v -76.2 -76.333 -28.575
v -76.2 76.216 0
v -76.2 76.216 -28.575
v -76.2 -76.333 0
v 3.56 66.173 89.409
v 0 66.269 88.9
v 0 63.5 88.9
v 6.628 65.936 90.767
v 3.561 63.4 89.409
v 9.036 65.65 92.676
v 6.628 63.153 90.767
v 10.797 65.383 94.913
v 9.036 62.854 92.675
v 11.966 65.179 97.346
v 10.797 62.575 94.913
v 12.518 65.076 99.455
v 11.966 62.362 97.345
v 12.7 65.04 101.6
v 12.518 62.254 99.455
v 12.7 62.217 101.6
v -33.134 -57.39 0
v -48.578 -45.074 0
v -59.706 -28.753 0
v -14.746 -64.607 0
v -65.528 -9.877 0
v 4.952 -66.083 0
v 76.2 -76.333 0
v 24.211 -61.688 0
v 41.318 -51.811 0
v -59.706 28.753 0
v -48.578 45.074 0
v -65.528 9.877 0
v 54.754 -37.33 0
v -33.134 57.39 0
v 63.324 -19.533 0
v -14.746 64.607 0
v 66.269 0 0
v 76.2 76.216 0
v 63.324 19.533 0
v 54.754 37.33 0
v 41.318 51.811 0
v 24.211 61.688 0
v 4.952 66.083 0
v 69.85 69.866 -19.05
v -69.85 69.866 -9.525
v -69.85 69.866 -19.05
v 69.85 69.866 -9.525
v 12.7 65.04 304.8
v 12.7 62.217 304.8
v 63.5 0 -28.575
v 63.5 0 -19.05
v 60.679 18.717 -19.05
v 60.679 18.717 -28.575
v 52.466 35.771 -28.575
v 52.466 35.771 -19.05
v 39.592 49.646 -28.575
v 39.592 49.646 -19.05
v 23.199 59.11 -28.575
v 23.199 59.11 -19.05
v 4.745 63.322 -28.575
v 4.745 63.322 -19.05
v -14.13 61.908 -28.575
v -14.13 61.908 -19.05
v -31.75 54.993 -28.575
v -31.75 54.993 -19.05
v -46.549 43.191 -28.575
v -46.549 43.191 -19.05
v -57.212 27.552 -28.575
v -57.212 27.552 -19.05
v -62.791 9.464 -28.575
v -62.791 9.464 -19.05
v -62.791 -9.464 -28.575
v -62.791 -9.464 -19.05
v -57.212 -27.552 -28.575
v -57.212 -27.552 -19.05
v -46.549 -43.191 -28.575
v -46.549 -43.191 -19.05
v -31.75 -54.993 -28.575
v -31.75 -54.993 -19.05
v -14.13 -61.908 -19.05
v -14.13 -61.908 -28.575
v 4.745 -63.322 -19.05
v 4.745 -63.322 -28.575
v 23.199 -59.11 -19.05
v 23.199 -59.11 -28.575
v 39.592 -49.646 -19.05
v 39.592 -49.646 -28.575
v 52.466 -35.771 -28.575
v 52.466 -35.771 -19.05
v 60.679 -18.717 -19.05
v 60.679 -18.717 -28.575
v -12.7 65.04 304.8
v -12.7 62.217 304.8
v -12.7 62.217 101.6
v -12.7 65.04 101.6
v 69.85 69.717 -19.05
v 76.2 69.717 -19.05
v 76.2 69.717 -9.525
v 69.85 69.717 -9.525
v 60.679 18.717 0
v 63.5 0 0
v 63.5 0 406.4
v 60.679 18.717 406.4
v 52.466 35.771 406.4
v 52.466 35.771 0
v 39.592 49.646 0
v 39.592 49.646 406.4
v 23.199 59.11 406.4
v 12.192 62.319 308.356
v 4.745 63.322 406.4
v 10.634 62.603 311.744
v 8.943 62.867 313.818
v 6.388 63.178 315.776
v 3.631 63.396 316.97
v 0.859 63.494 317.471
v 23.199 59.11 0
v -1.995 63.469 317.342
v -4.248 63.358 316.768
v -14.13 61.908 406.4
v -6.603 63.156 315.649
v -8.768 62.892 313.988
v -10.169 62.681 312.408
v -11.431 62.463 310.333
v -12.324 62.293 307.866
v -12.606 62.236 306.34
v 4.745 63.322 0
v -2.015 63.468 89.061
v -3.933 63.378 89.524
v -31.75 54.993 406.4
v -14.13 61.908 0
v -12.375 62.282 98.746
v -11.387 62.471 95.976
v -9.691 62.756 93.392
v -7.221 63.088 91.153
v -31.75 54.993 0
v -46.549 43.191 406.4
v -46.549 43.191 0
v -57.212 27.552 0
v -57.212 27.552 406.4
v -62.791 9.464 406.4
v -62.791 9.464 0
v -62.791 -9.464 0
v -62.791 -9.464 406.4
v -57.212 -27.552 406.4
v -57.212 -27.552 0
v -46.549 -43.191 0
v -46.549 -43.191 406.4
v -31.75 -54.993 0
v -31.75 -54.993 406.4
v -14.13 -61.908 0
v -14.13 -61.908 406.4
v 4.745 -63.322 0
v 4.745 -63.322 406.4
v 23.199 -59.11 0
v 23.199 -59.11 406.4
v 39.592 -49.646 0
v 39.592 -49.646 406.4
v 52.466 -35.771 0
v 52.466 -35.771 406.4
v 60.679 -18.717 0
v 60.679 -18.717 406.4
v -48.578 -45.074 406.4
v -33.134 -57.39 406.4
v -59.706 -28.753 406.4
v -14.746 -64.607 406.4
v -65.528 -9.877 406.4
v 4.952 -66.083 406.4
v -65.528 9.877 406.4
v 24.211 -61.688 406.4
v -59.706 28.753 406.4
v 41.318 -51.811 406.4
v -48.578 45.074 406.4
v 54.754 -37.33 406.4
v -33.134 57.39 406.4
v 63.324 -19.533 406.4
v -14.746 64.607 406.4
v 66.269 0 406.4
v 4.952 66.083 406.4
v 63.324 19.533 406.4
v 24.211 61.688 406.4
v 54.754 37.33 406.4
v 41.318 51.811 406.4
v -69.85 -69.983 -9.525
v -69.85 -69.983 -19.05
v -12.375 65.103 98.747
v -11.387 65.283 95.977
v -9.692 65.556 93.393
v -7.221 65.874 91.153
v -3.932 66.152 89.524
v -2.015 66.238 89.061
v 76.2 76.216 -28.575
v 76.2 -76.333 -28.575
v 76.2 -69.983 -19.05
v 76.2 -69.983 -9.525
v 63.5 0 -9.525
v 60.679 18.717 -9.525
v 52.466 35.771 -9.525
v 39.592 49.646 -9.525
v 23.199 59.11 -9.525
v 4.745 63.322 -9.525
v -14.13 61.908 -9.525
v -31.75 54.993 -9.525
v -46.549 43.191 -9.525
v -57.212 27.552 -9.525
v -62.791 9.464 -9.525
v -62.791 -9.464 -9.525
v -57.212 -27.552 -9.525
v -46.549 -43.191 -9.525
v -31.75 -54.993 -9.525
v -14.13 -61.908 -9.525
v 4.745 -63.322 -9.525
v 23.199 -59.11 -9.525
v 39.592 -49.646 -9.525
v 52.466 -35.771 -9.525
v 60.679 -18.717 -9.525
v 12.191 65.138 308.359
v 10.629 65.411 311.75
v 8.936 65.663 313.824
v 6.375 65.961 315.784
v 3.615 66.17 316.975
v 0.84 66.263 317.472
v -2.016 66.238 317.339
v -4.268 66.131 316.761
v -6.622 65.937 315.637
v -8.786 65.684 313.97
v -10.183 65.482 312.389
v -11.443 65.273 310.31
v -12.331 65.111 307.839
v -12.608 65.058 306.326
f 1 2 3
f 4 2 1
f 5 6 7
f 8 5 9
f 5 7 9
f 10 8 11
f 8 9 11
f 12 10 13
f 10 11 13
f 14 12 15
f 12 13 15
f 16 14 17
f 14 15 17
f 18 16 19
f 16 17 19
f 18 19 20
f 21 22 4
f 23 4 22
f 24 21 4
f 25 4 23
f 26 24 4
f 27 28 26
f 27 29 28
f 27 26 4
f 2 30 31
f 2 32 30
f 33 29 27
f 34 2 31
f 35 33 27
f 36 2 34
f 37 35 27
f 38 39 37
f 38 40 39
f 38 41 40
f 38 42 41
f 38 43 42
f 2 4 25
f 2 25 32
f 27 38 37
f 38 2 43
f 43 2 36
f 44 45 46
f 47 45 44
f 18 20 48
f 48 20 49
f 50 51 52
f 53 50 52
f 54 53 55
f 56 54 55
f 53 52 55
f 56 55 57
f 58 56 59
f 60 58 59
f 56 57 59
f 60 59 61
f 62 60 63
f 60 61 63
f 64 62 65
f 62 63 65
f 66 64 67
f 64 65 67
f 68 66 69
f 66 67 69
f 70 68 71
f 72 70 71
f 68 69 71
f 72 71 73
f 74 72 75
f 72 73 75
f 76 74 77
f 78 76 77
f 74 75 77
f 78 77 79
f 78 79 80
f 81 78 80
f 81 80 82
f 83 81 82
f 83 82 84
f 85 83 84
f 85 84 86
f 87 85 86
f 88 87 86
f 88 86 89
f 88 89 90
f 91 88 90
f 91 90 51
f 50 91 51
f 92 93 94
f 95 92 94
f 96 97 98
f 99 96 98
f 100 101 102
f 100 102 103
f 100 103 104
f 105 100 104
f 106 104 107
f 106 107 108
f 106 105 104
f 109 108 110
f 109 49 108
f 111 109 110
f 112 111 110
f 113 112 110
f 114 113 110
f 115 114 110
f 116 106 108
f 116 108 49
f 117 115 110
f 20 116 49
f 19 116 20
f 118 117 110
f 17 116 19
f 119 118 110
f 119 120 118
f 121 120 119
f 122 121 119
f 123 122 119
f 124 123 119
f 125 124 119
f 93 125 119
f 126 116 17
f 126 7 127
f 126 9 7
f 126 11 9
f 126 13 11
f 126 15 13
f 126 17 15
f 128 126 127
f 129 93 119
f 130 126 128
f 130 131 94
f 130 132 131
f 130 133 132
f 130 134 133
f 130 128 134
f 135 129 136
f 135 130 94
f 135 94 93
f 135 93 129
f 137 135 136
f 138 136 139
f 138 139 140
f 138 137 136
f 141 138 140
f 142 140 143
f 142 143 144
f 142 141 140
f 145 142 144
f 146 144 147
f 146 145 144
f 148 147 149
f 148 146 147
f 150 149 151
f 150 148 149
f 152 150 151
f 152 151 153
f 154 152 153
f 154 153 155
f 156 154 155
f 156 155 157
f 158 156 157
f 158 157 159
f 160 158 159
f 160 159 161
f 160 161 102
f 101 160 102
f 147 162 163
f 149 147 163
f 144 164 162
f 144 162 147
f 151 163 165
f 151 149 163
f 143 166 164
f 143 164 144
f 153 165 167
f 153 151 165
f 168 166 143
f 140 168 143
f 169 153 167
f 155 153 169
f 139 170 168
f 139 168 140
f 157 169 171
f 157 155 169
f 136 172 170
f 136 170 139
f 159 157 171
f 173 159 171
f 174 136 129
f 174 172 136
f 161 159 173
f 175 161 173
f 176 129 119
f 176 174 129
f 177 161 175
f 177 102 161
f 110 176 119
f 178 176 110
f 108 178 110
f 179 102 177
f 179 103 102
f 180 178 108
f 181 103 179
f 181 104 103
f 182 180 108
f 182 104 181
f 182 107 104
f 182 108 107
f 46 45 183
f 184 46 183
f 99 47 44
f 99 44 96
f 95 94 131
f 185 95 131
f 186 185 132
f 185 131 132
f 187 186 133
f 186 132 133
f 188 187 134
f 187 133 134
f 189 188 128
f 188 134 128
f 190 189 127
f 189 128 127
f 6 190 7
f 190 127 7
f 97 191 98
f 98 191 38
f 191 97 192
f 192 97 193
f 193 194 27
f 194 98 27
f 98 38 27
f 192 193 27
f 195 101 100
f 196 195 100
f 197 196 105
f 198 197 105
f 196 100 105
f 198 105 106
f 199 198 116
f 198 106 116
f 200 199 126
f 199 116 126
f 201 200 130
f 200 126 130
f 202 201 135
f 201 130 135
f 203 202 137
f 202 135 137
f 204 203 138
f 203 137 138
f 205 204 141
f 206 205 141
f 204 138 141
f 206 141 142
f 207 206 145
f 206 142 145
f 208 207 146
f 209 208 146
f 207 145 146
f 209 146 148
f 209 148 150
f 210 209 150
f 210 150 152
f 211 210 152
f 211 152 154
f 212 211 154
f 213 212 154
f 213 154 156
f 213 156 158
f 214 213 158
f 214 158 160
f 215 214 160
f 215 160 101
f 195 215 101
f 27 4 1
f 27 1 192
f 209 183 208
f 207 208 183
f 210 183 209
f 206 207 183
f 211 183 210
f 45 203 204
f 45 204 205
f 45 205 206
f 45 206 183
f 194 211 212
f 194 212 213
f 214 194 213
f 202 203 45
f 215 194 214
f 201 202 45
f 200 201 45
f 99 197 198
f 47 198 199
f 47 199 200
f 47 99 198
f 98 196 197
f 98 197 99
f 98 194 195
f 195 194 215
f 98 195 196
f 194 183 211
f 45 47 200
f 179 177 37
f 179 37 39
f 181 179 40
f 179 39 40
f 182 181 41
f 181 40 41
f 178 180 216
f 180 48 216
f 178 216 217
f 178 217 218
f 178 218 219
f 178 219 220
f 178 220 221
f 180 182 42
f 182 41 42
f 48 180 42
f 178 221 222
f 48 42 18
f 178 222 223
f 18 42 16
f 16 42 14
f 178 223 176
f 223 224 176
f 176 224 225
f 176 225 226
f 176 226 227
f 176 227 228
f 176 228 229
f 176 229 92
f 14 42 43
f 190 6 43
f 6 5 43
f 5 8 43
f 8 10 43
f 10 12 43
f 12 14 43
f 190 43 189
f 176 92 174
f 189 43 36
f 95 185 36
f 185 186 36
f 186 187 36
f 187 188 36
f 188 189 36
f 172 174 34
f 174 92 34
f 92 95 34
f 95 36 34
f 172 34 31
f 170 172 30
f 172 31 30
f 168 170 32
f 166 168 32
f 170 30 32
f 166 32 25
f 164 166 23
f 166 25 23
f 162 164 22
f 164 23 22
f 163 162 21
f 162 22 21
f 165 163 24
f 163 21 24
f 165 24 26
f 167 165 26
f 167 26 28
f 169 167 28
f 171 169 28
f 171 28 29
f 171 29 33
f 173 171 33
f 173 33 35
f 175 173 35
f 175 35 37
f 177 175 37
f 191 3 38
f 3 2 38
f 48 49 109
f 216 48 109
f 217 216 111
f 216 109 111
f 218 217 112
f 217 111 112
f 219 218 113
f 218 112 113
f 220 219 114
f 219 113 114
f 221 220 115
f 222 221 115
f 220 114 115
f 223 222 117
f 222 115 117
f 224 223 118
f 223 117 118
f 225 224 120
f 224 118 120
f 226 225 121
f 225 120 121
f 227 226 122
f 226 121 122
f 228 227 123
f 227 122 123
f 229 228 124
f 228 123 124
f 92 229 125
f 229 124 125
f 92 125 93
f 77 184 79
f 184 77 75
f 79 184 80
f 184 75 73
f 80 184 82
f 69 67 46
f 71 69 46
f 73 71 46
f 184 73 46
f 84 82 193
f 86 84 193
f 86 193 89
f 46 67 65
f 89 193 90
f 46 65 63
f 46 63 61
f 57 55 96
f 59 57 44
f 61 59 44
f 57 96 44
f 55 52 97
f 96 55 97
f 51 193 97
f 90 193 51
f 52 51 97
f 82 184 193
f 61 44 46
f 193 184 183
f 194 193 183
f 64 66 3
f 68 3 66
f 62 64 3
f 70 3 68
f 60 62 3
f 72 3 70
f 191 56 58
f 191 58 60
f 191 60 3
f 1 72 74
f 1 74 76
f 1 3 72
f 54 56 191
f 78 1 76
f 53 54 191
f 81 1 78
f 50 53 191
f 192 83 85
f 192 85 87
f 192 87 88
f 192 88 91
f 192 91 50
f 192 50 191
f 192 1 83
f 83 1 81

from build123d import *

# Parameters (mm, degrees)
F0_R      = 66.2686
F0_R_2    = 63.5
F1_DEPTH  = 406.4
F3_DEPTH  = 66.2696
F5_DEPTH  = 9.525
F6_W      = 152.4
F6_H      = 152.5488182802
F6_W_2    = 139.7
F6_H_2    = 139.8488182802
F7_DEPTH  = 9.525
F8_W      = 152.4
F8_H      = 152.5488182802
F9_DEPTH  = 9.525
F10_DEPTH = 28.576
F11_W     = 139.7
F11_H     = 9.525
F12_DEPTH = 25.4


with BuildPart() as f1:
    # F0 (on Top) → F1 (new body)
    with BuildSketch(Plane.XY):
        Circle(F0_R)
        Circle(F0_R_2, mode=Mode.SUBTRACT)
    extrude(amount=F1_DEPTH)

    # F2 (on Front) → F3 (cut, through all)
    with BuildSketch(Plane.XZ):
        with BuildLine():
            Line((-12.7, 203.2), (-12.7, 101.6))
            ThreePointArc((-12.7, 101.6), (-8.9802561211, 92.6197438789), (0, 88.9))
            ThreePointArc((0, 88.9), (8.9802561211, 92.6197438789), (12.7, 101.6))
            Line((12.7, 101.6), (12.7, 203.2))
            Line((12.7, 203.2), (12.7, 304.8))
            ThreePointArc((12.7, 304.8), (0, 317.5), (-12.7, 304.8))
            Line((-12.7, 304.8), (-12.7, 203.2))
        make_face()
    extrude(amount=-F3_DEPTH, mode=Mode.SUBTRACT)

    # F4 (on Top) → F5 (join)
    with BuildSketch(Plane.XY):
        Polygon((-76.2, 76.2159317421), (-76.2, 0.0159317421), (-76.2, -76.3328865381), (76.2, -76.3328865381), (76.2, 76.2159317421), align=None)
    extrude(amount=-F5_DEPTH)

    # F6 (on face) → F7 (join)
    with BuildSketch(Plane(origin=(0, 0, -9.525), x_dir=(1, 0, 0), z_dir=(0, 0, -1))):
        with Locations((0, 0.058477398)):
            Rectangle(F6_W, F6_H)
        with Locations((0, 0.058477398)):
            Rectangle(F6_W_2, F6_H_2, mode=Mode.SUBTRACT)
    extrude(amount=F7_DEPTH)

    # F8 (on face) → F9 (join)
    with BuildSketch(Plane(origin=(0, 0, -19.05), x_dir=(1, 0, 0), z_dir=(0, 0, -1))):
        with Locations((0, 0.058477398)):
            Rectangle(F8_W, F8_H)
    extrude(amount=F9_DEPTH)

    # F10 (cut, through all): a face of the model
    f10_faces = [f1.faces().sort_by_distance(p)[0] for p in [
        (0, 0, 0),
    ]]
    extrude(f10_faces, amount=-F10_DEPTH, mode=Mode.SUBTRACT)

    # F11 (on face) → F12 (cut)
    with BuildSketch(Plane.YZ.offset(76.2)):
        with Locations((-0.1328865381, -14.2875)):
            Rectangle(F11_W, F11_H)
    extrude(amount=-F12_DEPTH, mode=Mode.SUBTRACT)


solid = f1.part
